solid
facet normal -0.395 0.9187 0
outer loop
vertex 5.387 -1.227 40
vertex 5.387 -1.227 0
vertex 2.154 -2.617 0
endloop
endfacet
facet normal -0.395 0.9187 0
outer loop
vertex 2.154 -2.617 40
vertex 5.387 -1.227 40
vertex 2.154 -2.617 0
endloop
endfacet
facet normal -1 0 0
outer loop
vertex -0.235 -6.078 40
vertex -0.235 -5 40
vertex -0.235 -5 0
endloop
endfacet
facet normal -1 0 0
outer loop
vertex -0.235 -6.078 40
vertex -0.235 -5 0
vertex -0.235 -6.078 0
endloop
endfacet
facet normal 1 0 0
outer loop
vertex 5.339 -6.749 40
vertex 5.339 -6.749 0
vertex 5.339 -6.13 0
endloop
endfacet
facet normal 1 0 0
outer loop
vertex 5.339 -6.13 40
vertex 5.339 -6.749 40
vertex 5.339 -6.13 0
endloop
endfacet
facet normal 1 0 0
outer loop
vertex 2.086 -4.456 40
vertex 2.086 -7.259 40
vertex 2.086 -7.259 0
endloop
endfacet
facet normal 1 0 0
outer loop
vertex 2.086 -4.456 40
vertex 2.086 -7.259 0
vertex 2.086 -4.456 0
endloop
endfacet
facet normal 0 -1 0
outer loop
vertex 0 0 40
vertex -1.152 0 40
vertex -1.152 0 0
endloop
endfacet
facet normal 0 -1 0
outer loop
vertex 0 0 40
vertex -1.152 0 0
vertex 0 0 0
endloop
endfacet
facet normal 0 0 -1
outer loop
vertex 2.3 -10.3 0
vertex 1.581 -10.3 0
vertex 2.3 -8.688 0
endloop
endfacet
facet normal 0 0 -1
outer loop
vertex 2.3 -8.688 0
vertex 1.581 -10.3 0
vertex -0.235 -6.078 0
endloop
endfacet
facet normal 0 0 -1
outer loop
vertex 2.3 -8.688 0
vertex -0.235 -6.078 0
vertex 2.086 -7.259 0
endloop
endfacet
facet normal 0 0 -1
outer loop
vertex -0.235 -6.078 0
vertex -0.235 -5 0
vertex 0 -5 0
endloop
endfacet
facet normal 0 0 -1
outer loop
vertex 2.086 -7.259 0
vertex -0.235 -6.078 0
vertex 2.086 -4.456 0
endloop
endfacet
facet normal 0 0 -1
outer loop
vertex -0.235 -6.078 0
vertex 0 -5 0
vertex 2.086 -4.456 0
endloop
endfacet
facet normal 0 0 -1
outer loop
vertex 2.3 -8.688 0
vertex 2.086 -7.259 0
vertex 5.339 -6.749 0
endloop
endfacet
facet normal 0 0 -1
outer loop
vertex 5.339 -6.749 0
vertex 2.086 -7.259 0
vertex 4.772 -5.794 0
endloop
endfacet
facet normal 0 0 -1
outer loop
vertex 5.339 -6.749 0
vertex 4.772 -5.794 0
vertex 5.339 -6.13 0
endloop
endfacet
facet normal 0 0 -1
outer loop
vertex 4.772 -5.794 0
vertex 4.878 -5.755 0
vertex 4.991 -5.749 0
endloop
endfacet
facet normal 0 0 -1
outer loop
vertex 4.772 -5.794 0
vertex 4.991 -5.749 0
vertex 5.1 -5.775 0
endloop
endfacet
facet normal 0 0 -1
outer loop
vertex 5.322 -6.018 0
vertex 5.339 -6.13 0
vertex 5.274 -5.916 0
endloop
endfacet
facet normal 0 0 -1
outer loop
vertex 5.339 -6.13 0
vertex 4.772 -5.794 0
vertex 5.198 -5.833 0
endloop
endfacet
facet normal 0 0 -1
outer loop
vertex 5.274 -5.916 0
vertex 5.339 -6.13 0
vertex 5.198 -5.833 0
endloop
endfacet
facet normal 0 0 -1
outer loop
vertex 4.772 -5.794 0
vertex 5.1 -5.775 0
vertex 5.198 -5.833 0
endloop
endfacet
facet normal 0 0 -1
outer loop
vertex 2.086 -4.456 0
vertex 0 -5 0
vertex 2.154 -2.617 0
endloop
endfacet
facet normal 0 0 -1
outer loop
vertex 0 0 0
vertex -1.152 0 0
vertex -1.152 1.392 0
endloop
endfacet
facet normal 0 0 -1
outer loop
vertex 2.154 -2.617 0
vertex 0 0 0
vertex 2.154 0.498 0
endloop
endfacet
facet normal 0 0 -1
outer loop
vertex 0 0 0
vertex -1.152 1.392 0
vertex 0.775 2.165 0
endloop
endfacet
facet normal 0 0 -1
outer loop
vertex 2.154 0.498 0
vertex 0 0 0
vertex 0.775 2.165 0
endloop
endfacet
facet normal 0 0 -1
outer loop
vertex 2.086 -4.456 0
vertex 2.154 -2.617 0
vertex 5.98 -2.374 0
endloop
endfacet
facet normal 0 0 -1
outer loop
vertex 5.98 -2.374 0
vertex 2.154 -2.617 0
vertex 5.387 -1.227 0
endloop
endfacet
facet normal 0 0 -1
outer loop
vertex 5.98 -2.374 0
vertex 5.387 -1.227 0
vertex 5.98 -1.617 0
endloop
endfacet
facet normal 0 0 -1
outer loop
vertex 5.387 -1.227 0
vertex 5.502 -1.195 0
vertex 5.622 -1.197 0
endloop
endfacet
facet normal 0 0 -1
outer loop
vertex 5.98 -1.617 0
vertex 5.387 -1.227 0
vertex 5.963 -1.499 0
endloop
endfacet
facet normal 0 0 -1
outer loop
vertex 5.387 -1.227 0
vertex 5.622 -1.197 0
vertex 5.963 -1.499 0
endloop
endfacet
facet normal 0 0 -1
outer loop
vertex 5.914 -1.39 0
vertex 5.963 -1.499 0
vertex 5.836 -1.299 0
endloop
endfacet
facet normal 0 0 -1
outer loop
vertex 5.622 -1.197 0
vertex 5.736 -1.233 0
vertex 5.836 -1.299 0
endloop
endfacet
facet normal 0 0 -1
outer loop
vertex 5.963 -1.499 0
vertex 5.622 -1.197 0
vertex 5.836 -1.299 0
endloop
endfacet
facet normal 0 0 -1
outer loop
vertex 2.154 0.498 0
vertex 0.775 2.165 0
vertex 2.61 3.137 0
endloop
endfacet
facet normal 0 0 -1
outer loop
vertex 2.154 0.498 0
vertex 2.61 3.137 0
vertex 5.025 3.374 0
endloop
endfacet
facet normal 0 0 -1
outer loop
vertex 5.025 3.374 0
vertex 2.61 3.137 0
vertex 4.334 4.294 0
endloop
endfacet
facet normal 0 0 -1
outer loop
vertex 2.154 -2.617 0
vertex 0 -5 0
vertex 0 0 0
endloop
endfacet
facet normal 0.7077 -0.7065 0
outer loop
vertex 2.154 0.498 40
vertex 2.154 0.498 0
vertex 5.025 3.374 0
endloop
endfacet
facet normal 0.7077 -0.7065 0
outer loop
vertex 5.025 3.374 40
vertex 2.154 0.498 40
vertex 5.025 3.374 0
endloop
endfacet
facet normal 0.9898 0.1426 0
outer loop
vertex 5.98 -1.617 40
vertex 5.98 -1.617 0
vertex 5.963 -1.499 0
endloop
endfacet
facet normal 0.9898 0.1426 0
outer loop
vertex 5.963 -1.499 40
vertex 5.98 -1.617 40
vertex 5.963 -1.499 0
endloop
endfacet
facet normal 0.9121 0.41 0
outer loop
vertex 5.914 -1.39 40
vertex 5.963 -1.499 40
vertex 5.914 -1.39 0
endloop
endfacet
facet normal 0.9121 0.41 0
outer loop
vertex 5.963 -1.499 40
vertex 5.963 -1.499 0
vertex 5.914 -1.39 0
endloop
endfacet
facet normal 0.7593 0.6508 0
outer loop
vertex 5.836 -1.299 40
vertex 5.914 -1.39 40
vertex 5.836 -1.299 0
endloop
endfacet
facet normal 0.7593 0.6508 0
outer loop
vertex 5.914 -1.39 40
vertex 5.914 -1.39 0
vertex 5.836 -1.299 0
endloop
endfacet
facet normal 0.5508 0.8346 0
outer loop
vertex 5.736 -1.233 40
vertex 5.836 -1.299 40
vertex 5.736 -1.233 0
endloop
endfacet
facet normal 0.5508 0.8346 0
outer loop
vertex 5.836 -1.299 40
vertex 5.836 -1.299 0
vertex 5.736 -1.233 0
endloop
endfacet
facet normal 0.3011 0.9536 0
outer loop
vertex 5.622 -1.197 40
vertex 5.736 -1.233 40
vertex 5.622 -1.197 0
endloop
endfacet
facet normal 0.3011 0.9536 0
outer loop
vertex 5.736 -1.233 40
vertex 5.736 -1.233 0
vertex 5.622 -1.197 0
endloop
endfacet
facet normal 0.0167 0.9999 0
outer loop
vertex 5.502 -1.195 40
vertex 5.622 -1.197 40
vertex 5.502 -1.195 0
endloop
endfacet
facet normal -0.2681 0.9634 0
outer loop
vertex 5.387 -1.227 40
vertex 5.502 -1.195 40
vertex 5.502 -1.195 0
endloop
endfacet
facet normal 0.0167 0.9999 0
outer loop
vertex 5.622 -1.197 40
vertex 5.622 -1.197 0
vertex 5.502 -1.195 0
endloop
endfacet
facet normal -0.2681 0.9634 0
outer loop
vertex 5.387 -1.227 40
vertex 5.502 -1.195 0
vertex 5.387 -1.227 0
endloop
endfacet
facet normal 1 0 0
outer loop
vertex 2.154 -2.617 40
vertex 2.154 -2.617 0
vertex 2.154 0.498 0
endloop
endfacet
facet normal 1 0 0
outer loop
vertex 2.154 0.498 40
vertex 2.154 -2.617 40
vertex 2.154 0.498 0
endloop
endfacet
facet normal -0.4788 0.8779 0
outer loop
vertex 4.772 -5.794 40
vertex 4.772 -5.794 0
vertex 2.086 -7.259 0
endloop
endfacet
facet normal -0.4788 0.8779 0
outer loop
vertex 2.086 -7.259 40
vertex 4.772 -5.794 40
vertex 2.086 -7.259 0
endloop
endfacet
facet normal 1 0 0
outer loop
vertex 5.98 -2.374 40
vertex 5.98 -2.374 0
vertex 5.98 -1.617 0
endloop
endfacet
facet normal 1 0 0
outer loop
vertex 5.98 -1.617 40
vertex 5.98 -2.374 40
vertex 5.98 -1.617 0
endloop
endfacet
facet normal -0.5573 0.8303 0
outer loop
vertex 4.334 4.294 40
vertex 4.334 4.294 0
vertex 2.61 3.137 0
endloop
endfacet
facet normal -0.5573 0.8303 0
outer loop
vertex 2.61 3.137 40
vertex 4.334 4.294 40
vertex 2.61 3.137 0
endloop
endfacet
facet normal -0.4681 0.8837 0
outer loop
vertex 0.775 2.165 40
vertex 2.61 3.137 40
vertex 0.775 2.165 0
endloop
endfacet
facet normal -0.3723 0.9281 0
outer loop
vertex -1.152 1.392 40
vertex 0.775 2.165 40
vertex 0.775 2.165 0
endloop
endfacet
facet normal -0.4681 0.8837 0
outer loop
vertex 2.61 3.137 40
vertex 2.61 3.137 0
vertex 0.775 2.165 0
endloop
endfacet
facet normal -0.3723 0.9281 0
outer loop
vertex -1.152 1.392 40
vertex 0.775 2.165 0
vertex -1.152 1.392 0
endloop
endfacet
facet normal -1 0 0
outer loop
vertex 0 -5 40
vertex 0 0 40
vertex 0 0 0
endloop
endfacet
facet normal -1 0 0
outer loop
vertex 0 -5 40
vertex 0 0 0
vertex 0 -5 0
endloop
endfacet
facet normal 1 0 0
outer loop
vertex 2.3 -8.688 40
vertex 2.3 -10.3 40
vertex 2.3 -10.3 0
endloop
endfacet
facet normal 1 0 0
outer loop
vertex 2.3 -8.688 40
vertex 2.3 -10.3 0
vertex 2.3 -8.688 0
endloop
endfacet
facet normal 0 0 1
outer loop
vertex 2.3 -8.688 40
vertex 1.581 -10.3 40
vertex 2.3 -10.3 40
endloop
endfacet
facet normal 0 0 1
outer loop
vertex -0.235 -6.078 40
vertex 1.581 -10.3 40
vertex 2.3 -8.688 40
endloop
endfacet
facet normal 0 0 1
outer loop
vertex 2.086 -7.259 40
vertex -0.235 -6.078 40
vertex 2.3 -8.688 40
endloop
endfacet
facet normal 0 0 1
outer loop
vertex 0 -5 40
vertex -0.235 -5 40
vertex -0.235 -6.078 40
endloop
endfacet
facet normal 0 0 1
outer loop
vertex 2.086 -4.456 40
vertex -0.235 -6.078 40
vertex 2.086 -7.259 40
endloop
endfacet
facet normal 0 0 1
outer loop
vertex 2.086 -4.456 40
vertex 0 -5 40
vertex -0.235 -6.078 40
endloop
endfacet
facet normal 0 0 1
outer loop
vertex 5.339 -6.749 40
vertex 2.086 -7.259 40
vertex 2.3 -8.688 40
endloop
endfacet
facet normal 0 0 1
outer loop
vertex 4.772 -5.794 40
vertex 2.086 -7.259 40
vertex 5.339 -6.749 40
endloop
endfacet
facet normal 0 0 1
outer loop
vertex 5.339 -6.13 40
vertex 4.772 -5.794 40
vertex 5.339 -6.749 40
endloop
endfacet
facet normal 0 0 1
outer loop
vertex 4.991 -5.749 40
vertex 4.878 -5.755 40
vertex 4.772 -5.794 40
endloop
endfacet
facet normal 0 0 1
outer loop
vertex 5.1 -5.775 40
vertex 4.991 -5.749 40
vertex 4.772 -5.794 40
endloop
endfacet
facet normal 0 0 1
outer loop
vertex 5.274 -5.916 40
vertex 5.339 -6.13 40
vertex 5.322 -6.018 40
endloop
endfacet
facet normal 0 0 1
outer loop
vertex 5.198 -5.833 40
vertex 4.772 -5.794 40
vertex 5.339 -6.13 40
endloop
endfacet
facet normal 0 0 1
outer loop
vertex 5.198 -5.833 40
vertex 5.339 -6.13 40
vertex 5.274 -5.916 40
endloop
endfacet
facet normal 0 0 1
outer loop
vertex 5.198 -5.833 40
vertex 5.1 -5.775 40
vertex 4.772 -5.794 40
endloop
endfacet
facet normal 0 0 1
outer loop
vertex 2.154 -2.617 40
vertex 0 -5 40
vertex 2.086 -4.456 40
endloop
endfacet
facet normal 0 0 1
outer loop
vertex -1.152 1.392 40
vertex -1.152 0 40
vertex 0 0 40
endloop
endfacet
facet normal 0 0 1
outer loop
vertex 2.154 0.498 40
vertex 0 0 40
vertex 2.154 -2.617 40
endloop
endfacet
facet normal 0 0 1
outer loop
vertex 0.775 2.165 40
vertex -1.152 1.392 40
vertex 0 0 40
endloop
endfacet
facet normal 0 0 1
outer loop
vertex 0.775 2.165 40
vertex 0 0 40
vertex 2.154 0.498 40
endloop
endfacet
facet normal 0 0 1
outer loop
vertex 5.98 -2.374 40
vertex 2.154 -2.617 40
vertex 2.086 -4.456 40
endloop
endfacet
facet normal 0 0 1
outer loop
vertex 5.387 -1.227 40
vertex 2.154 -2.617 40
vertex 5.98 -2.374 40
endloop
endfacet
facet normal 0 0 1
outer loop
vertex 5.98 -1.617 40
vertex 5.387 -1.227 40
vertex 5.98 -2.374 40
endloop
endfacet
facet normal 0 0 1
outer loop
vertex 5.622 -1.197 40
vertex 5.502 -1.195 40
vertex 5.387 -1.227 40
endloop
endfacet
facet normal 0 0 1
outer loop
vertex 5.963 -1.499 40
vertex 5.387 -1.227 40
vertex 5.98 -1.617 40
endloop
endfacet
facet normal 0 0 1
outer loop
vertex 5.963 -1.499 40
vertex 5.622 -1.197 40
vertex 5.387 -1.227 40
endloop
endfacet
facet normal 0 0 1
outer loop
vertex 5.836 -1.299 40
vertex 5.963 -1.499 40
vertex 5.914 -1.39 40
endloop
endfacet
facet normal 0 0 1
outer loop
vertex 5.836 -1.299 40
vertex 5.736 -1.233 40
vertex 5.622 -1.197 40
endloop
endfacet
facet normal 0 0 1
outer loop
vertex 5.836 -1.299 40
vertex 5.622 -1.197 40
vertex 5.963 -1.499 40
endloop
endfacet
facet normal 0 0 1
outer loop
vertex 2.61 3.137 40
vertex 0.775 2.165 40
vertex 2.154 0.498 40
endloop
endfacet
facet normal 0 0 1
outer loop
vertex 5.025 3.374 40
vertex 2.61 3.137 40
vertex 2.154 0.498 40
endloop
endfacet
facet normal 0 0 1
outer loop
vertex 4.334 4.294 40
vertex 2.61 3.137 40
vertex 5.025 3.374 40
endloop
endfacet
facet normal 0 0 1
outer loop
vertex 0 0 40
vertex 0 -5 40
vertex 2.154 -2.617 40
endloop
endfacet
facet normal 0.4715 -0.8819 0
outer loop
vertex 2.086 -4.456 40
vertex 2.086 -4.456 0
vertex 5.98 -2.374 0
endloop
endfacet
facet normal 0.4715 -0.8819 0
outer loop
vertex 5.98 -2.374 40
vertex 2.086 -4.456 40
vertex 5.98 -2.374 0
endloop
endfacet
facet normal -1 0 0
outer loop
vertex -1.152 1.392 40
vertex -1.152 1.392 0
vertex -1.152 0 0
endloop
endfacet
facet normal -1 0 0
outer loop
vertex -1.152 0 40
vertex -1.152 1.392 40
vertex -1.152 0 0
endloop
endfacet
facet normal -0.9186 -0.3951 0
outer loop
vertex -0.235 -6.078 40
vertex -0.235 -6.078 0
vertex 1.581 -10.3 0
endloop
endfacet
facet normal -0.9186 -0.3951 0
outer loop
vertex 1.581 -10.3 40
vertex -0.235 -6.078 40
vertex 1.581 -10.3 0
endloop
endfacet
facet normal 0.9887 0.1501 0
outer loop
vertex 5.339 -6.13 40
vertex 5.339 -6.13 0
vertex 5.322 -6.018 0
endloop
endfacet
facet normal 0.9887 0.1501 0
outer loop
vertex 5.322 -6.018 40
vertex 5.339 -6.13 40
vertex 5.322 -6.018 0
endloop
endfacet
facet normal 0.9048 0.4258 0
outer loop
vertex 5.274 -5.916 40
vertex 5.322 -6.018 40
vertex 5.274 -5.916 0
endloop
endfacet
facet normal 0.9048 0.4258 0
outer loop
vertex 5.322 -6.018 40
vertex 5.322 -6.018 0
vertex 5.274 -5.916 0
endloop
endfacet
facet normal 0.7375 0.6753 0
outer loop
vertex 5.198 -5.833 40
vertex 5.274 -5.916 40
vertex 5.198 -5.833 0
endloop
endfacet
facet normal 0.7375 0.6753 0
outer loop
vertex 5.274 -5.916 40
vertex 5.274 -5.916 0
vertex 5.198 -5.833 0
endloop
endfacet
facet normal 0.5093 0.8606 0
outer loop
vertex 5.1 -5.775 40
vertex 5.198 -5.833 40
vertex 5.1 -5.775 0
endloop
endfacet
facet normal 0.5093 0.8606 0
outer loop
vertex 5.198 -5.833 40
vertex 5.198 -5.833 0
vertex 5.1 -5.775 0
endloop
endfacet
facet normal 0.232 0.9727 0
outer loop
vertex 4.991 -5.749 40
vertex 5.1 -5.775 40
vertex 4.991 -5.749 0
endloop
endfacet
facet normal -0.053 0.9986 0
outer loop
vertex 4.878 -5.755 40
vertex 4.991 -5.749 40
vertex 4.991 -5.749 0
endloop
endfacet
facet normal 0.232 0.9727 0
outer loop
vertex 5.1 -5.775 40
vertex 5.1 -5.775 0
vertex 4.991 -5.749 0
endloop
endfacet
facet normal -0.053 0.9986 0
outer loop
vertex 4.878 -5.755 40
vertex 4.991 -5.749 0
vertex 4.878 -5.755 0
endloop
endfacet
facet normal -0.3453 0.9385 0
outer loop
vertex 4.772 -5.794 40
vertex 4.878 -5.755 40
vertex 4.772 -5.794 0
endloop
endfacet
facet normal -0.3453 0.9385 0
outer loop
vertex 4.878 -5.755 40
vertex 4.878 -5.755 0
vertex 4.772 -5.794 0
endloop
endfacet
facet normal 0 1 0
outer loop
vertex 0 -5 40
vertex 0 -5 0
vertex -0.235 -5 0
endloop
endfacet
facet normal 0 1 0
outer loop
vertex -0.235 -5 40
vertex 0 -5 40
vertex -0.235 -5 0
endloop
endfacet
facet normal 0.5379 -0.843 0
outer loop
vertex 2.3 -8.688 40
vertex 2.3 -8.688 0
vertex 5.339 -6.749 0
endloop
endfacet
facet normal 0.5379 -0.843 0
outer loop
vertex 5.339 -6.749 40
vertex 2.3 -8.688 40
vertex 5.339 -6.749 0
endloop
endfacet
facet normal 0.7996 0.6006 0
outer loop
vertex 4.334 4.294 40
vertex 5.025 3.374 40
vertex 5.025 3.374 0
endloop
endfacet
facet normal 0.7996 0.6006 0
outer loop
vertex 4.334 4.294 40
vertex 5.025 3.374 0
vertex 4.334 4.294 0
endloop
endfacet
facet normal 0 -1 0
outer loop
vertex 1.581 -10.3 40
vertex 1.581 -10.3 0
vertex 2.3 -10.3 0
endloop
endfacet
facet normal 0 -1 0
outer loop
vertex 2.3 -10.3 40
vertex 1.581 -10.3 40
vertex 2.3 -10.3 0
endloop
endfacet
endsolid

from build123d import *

# Parameters (mm, degrees)
EXTRUDE_1_DEPTH = 40


with BuildPart() as part:
    # Эскиз1 → Бобышка-Вытянуть1 (new body)
    with BuildSketch(Plane.XY):
        with BuildLine():
            Line((0, 0), (0, -5))
            Line((0, -5), (-0.235052359, -5))
            Line((-0.235052359, -5), (-0.235052359, -6.077530645))
            Line((-0.235052359, -6.077530645), (1.580879478, -10.300026718))
            Line((1.580879478, -10.300026718), (2.299876794, -10.300026718))
            Line((2.299876794, -10.300026718), (2.299876794, -8.688248945))
            Line((2.299876794, -8.688248945), (5.338733825, -6.749380382))
            Line((5.338733825, -6.749380382), (5.338733825, -6.130118817))
            ThreePointArc((5.338733825, -6.130118817), (5.151167457, -5.800618872), (4.772085378, -5.793681018))
            Line((4.772085378, -5.793681018), (2.085504308, -7.258574696))
            Line((2.085504308, -7.258574696), (2.085504308, -4.45645656))
            Line((2.085504308, -4.45645656), (5.980110004, -2.374221663))
            Line((5.980110004, -2.374221663), (5.980110004, -1.617236279))
            ThreePointArc((5.980110004, -1.617236279), (5.788765805, -1.262133881), (5.386956071, -1.226647924))
            Line((5.386956071, -1.226647924), (2.15420838, -2.616927359))
            Line((2.15420838, -2.616927359), (2.15420838, 0.497930702))
            Line((2.15420838, 0.497930702), (5.024831948, 3.373619708))
            Line((5.024831948, 3.373619708), (4.333601466, 4.294416481))
            ThreePointArc((4.333601466, 4.294416481), (1.705007112, 2.626935837), (-1.152317838, 1.391745925))
            Line((-1.152317838, 1.391745925), (-1.152317838, 0))
            Line((-1.152317838, 0), (0, 0))
        make_face()
    extrude(amount=EXTRUDE_1_DEPTH)


solid = part.part
